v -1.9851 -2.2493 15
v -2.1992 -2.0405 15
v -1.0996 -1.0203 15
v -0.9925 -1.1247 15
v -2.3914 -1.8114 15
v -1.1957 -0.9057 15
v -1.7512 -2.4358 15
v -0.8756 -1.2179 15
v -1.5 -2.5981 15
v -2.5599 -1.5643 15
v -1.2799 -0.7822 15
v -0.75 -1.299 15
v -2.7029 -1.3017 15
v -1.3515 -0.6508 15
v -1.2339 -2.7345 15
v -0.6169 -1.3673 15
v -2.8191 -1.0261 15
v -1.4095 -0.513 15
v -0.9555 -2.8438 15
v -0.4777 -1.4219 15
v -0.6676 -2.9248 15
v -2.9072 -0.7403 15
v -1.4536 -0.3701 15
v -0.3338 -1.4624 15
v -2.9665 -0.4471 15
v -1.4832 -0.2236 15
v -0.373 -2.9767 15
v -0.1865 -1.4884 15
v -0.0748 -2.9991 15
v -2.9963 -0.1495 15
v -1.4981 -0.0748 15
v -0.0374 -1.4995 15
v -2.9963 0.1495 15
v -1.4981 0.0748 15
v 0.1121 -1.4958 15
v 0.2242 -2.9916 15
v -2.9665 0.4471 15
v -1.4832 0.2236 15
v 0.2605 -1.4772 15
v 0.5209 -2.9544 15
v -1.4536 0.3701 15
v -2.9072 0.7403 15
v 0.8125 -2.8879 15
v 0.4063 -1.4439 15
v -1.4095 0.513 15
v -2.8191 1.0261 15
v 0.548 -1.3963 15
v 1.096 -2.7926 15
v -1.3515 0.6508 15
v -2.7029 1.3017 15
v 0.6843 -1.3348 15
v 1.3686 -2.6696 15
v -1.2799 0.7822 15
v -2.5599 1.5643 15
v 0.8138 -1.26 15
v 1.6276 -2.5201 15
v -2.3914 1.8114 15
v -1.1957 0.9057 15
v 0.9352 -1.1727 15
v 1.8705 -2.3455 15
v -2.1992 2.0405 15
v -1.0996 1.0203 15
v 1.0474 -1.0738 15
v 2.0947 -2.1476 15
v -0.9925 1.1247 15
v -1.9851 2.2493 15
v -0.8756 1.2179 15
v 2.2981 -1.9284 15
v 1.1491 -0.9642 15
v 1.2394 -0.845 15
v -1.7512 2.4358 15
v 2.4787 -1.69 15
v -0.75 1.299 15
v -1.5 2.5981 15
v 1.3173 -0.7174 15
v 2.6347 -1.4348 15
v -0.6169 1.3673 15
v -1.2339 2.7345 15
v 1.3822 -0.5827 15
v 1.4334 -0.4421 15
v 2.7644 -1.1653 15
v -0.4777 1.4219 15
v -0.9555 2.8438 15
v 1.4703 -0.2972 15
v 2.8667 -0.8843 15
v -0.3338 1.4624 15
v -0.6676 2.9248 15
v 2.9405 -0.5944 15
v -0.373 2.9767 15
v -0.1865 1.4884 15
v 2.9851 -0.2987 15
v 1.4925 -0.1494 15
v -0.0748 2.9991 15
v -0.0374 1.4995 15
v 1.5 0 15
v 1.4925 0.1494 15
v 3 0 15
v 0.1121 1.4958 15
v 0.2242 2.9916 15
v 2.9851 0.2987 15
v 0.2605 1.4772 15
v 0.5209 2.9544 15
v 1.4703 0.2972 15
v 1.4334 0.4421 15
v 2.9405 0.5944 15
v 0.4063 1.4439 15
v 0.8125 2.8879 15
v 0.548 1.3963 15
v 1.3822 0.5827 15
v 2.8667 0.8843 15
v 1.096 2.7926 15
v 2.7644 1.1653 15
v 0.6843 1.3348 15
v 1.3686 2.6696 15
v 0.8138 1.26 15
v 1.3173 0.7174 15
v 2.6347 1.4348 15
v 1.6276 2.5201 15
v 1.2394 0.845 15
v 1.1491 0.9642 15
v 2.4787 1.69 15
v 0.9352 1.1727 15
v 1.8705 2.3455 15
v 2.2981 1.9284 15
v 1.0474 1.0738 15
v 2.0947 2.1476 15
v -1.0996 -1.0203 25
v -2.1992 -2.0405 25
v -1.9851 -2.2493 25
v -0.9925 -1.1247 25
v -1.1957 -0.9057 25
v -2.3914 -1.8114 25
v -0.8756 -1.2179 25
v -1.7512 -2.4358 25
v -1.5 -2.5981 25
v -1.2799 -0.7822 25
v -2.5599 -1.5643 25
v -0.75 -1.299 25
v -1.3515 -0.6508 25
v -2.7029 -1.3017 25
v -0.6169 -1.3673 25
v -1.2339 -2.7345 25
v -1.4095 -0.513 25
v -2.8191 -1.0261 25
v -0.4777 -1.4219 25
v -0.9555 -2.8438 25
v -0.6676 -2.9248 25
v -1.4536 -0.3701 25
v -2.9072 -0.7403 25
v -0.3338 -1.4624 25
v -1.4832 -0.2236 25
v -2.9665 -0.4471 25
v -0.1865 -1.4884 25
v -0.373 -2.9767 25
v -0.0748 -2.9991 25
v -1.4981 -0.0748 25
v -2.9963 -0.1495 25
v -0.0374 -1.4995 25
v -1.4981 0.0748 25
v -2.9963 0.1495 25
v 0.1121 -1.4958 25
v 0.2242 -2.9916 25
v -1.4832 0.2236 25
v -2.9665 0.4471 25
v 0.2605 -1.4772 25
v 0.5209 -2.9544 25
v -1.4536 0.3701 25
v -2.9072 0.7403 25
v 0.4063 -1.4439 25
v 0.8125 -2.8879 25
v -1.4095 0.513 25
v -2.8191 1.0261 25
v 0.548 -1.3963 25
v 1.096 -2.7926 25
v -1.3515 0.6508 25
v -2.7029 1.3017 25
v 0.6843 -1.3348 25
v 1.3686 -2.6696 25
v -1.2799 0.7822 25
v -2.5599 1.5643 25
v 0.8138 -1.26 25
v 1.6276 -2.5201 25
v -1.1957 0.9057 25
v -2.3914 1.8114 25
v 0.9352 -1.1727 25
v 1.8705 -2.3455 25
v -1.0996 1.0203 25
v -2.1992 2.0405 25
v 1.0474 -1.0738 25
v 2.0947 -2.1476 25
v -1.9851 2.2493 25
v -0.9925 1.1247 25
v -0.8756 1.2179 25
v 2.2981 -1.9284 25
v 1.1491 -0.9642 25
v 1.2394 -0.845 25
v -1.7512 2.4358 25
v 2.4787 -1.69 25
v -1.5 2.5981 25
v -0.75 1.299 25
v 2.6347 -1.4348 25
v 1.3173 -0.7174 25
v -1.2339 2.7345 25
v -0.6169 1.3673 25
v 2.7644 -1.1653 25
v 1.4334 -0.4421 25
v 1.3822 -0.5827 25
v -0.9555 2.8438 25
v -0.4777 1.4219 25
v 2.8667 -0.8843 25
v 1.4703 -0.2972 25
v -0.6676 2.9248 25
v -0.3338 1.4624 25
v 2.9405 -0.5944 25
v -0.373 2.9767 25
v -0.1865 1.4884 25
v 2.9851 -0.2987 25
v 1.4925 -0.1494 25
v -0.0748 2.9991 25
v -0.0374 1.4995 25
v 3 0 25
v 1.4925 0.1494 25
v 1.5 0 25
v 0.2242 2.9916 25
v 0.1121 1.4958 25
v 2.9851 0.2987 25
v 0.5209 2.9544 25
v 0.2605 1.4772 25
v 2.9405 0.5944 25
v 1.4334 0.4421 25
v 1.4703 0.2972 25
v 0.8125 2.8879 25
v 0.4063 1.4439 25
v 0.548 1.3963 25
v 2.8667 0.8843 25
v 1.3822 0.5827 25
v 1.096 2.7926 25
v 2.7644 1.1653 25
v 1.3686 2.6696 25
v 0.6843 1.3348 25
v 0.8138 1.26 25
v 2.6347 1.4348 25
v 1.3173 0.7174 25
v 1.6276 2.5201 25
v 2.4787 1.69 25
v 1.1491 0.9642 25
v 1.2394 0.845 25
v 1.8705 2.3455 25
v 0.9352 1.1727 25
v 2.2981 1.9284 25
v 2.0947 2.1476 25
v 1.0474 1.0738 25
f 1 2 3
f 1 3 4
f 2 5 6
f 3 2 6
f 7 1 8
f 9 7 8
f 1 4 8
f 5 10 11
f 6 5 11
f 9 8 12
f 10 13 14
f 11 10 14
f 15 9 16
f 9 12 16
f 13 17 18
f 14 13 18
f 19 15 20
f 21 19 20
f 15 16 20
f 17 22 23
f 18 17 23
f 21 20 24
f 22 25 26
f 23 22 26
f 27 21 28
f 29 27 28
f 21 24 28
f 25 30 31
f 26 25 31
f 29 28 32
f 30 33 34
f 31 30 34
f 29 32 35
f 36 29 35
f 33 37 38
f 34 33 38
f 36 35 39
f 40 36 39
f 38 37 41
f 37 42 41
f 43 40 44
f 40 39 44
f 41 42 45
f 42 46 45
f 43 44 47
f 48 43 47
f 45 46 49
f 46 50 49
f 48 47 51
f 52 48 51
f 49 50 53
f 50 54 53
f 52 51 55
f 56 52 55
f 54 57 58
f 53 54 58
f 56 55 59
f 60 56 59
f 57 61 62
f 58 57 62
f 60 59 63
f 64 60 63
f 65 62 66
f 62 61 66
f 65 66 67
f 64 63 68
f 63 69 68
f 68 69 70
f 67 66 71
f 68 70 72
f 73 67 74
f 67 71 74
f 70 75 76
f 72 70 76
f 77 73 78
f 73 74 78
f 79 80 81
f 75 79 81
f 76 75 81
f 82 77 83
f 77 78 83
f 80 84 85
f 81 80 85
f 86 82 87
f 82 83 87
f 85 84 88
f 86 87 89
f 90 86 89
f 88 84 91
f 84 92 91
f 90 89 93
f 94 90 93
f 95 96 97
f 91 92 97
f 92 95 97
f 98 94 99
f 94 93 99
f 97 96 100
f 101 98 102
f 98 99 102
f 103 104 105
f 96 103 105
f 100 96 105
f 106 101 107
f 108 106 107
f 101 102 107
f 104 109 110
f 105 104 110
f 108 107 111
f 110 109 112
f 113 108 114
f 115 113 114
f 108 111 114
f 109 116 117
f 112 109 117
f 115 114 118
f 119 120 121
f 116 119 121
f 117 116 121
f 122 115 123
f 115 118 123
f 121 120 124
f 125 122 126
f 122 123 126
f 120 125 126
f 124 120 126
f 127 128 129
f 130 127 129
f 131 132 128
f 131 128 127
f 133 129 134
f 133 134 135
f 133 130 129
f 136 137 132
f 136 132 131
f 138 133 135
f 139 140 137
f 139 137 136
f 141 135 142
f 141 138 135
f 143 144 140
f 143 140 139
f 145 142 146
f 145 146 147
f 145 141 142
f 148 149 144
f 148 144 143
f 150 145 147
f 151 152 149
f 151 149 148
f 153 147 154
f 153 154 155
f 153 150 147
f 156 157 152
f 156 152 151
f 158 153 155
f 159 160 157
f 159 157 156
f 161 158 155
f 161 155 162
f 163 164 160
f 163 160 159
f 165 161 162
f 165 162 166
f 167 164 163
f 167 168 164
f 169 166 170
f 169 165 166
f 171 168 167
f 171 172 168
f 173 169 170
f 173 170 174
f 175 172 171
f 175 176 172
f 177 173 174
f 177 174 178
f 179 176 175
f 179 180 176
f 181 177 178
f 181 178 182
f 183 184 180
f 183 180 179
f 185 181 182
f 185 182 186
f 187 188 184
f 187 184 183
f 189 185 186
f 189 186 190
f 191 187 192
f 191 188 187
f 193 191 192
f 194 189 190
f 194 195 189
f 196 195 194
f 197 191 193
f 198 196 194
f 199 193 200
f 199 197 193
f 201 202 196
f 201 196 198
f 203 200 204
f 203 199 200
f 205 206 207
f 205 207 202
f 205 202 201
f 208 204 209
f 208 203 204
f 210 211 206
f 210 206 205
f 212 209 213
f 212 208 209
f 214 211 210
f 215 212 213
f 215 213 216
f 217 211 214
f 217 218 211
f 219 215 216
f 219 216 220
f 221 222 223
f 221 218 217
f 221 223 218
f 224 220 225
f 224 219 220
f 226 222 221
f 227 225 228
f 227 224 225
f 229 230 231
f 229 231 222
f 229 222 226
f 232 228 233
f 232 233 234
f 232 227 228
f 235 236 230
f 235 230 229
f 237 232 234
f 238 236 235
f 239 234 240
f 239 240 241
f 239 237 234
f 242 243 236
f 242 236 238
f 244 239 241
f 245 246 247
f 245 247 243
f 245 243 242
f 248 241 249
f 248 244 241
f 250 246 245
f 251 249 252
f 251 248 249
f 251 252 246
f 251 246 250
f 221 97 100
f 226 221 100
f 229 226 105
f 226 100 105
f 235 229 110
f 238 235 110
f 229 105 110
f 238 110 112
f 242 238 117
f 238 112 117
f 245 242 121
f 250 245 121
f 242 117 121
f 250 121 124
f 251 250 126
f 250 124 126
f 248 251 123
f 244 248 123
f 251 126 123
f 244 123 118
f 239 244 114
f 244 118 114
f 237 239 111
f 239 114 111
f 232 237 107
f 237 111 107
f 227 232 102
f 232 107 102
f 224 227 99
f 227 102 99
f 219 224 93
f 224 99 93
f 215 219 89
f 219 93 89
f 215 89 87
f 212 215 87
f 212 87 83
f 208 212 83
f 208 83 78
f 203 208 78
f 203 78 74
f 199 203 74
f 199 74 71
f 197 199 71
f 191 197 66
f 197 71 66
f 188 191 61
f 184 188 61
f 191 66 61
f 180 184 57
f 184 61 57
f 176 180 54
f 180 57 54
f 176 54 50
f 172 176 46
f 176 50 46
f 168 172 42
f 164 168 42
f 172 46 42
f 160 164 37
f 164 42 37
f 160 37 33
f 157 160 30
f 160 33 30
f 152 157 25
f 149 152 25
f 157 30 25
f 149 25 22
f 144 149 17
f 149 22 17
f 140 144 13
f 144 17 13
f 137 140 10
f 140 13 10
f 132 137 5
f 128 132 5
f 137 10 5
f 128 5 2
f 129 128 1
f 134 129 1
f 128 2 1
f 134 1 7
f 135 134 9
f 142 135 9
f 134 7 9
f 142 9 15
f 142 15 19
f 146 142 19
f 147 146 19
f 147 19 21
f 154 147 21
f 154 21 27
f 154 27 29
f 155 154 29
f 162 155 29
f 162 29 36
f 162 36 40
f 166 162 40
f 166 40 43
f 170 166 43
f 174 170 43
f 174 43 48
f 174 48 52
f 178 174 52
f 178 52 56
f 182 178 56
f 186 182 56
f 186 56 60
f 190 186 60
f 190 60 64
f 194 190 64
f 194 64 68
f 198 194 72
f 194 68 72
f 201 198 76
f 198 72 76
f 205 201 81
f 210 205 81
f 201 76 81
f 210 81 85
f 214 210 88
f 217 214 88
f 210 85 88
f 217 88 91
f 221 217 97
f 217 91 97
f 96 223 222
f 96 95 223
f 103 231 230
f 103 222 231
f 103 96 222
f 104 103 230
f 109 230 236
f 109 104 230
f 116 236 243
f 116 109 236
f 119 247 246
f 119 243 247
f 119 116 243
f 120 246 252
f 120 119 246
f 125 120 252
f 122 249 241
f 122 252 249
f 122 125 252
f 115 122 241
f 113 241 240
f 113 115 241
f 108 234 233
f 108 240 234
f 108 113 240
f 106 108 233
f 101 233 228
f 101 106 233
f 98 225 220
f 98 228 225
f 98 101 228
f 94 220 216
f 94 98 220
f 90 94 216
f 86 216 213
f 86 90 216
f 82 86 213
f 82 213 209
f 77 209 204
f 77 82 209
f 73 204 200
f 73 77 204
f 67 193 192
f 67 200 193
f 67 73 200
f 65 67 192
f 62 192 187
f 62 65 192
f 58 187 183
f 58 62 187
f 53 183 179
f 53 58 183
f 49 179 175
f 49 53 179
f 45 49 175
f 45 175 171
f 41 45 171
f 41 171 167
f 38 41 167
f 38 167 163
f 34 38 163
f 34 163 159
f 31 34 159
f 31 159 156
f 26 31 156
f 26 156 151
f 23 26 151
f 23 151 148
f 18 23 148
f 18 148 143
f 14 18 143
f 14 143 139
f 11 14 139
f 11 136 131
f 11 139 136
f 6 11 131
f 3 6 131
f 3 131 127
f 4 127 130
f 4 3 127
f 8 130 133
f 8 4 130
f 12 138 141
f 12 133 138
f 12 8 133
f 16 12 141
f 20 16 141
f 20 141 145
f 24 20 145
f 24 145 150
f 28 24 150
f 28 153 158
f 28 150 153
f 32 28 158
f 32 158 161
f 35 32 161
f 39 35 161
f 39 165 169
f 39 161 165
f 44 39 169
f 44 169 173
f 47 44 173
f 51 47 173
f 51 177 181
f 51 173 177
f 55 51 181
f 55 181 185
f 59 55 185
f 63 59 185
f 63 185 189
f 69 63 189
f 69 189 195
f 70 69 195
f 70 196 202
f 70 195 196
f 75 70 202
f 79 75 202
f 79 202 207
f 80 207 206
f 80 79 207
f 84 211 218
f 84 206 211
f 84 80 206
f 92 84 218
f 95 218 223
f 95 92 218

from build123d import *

# Parameters (mm, degrees)
CYLINDER003_R     = 1.5
CYLINDER003_DEPTH = 30
CYLINDER001_R     = 3
CYLINDER001_DEPTH = 10


with BuildPart() as screw_cutout:
    # Cylinder003 → Cylinder003 (new body)
    with BuildSketch(Plane.XY):
        Circle(CYLINDER003_R)
    extrude(amount=CYLINDER003_DEPTH)


with BuildPart() as cut:
    # Cylinder001 → Cylinder001 (new body)
    with BuildSketch(Plane.XY.offset(15)):
        Circle(CYLINDER001_R)
    extrude(amount=CYLINDER001_DEPTH)

    # Cut: cut screw cutout
    add(screw_cutout.part, mode=Mode.SUBTRACT)


solid = cut.part
